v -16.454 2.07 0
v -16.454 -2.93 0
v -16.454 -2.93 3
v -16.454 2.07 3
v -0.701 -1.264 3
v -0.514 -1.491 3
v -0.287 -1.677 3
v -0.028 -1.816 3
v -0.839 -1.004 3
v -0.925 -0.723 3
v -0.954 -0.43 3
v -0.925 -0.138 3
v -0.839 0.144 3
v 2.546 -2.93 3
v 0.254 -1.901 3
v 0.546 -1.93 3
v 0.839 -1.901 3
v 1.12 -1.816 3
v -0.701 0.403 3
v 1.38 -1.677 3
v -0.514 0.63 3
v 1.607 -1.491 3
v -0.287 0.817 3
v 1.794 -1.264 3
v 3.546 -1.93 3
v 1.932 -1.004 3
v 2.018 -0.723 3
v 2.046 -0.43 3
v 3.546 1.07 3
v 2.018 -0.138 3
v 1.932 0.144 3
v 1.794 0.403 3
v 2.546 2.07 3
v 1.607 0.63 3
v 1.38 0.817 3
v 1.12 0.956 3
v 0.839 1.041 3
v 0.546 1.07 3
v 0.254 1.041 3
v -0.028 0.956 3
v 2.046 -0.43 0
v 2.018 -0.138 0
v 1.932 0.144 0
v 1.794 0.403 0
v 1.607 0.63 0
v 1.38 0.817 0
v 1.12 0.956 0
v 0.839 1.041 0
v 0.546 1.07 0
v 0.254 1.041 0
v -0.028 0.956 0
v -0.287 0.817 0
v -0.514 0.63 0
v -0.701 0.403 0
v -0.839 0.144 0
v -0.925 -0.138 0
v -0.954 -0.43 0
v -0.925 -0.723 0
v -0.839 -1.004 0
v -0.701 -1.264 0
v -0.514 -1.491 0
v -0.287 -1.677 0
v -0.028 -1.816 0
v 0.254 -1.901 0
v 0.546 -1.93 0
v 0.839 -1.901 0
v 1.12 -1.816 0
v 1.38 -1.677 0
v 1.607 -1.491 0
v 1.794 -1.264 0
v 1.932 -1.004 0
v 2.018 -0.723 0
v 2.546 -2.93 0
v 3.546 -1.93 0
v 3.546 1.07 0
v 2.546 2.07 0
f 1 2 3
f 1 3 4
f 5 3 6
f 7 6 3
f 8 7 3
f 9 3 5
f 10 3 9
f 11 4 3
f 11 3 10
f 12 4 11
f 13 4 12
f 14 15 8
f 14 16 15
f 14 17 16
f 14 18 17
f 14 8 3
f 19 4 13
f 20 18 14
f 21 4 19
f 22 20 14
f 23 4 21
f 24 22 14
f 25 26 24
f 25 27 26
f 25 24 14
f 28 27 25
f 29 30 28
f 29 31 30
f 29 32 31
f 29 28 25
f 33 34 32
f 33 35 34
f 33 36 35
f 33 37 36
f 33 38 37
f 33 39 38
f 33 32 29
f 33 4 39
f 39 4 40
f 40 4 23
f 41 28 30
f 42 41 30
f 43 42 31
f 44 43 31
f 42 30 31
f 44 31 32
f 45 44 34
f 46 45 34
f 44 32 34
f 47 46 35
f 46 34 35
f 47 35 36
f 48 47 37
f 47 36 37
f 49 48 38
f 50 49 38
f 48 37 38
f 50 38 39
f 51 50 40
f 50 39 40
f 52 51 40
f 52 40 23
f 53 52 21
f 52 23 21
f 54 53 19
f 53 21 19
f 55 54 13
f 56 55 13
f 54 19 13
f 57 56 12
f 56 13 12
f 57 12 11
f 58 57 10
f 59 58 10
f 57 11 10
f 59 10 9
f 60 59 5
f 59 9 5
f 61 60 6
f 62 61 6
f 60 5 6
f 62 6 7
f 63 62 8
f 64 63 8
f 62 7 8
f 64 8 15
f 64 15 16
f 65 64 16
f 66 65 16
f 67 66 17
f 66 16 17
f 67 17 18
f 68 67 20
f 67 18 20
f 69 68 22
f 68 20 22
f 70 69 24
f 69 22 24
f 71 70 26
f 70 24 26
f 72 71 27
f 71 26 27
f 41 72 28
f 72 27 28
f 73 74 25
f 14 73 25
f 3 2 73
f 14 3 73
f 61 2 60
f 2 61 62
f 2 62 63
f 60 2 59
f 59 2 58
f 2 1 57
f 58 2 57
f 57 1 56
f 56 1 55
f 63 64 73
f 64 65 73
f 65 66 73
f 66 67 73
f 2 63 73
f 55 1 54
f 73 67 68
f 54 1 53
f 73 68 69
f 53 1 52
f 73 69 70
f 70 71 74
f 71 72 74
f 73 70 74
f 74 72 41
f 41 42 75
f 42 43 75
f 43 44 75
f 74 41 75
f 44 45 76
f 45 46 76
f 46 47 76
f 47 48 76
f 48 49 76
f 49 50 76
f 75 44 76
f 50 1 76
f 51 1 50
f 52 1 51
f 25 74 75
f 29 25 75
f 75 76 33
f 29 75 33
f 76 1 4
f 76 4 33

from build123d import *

# Parameters (mm, degrees)
SKETCH_1_W          = 20
SKETCH_1_H          = 5
EXTRUDE_1_DEPTH     = 3
SKETCH_2_R          = 1.5
CUT_EXTRUDE_1_DEPTH = 3
CHAMFER_1_SIZE      = 1
CHAMFER_2_SIZE      = 1


with BuildPart() as part:
    # 草图1 → 凸台-拉伸1 (new body)
    with BuildSketch(Plane.XY):
        with Locations((-6.4536035, -0.430232558)):
            Rectangle(SKETCH_1_W, SKETCH_1_H)
    extrude(amount=EXTRUDE_1_DEPTH)

    # 草图2 → 切除-拉伸1 (cut)
    with BuildSketch(Plane.XY.offset(3)):
        with Locations((0.5463965, -0.430232558)):
            Circle(SKETCH_2_R)
    extrude(amount=-CUT_EXTRUDE_1_DEPTH, mode=Mode.SUBTRACT)

    # 倒角1
    chamfer_1_edges = [part.edges().sort_by_distance(p)[0] for p in [
        (3.5463965, -2.930232558, 1.5),
    ]]
    chamfer(chamfer_1_edges, length=CHAMFER_1_SIZE)

    # 倒角2
    chamfer_2_edges = [part.edges().sort_by_distance(p)[0] for p in [
        (3.5463965, 2.069767442, 1.5),
    ]]
    chamfer(chamfer_2_edges, length=CHAMFER_2_SIZE)


solid = part.part
